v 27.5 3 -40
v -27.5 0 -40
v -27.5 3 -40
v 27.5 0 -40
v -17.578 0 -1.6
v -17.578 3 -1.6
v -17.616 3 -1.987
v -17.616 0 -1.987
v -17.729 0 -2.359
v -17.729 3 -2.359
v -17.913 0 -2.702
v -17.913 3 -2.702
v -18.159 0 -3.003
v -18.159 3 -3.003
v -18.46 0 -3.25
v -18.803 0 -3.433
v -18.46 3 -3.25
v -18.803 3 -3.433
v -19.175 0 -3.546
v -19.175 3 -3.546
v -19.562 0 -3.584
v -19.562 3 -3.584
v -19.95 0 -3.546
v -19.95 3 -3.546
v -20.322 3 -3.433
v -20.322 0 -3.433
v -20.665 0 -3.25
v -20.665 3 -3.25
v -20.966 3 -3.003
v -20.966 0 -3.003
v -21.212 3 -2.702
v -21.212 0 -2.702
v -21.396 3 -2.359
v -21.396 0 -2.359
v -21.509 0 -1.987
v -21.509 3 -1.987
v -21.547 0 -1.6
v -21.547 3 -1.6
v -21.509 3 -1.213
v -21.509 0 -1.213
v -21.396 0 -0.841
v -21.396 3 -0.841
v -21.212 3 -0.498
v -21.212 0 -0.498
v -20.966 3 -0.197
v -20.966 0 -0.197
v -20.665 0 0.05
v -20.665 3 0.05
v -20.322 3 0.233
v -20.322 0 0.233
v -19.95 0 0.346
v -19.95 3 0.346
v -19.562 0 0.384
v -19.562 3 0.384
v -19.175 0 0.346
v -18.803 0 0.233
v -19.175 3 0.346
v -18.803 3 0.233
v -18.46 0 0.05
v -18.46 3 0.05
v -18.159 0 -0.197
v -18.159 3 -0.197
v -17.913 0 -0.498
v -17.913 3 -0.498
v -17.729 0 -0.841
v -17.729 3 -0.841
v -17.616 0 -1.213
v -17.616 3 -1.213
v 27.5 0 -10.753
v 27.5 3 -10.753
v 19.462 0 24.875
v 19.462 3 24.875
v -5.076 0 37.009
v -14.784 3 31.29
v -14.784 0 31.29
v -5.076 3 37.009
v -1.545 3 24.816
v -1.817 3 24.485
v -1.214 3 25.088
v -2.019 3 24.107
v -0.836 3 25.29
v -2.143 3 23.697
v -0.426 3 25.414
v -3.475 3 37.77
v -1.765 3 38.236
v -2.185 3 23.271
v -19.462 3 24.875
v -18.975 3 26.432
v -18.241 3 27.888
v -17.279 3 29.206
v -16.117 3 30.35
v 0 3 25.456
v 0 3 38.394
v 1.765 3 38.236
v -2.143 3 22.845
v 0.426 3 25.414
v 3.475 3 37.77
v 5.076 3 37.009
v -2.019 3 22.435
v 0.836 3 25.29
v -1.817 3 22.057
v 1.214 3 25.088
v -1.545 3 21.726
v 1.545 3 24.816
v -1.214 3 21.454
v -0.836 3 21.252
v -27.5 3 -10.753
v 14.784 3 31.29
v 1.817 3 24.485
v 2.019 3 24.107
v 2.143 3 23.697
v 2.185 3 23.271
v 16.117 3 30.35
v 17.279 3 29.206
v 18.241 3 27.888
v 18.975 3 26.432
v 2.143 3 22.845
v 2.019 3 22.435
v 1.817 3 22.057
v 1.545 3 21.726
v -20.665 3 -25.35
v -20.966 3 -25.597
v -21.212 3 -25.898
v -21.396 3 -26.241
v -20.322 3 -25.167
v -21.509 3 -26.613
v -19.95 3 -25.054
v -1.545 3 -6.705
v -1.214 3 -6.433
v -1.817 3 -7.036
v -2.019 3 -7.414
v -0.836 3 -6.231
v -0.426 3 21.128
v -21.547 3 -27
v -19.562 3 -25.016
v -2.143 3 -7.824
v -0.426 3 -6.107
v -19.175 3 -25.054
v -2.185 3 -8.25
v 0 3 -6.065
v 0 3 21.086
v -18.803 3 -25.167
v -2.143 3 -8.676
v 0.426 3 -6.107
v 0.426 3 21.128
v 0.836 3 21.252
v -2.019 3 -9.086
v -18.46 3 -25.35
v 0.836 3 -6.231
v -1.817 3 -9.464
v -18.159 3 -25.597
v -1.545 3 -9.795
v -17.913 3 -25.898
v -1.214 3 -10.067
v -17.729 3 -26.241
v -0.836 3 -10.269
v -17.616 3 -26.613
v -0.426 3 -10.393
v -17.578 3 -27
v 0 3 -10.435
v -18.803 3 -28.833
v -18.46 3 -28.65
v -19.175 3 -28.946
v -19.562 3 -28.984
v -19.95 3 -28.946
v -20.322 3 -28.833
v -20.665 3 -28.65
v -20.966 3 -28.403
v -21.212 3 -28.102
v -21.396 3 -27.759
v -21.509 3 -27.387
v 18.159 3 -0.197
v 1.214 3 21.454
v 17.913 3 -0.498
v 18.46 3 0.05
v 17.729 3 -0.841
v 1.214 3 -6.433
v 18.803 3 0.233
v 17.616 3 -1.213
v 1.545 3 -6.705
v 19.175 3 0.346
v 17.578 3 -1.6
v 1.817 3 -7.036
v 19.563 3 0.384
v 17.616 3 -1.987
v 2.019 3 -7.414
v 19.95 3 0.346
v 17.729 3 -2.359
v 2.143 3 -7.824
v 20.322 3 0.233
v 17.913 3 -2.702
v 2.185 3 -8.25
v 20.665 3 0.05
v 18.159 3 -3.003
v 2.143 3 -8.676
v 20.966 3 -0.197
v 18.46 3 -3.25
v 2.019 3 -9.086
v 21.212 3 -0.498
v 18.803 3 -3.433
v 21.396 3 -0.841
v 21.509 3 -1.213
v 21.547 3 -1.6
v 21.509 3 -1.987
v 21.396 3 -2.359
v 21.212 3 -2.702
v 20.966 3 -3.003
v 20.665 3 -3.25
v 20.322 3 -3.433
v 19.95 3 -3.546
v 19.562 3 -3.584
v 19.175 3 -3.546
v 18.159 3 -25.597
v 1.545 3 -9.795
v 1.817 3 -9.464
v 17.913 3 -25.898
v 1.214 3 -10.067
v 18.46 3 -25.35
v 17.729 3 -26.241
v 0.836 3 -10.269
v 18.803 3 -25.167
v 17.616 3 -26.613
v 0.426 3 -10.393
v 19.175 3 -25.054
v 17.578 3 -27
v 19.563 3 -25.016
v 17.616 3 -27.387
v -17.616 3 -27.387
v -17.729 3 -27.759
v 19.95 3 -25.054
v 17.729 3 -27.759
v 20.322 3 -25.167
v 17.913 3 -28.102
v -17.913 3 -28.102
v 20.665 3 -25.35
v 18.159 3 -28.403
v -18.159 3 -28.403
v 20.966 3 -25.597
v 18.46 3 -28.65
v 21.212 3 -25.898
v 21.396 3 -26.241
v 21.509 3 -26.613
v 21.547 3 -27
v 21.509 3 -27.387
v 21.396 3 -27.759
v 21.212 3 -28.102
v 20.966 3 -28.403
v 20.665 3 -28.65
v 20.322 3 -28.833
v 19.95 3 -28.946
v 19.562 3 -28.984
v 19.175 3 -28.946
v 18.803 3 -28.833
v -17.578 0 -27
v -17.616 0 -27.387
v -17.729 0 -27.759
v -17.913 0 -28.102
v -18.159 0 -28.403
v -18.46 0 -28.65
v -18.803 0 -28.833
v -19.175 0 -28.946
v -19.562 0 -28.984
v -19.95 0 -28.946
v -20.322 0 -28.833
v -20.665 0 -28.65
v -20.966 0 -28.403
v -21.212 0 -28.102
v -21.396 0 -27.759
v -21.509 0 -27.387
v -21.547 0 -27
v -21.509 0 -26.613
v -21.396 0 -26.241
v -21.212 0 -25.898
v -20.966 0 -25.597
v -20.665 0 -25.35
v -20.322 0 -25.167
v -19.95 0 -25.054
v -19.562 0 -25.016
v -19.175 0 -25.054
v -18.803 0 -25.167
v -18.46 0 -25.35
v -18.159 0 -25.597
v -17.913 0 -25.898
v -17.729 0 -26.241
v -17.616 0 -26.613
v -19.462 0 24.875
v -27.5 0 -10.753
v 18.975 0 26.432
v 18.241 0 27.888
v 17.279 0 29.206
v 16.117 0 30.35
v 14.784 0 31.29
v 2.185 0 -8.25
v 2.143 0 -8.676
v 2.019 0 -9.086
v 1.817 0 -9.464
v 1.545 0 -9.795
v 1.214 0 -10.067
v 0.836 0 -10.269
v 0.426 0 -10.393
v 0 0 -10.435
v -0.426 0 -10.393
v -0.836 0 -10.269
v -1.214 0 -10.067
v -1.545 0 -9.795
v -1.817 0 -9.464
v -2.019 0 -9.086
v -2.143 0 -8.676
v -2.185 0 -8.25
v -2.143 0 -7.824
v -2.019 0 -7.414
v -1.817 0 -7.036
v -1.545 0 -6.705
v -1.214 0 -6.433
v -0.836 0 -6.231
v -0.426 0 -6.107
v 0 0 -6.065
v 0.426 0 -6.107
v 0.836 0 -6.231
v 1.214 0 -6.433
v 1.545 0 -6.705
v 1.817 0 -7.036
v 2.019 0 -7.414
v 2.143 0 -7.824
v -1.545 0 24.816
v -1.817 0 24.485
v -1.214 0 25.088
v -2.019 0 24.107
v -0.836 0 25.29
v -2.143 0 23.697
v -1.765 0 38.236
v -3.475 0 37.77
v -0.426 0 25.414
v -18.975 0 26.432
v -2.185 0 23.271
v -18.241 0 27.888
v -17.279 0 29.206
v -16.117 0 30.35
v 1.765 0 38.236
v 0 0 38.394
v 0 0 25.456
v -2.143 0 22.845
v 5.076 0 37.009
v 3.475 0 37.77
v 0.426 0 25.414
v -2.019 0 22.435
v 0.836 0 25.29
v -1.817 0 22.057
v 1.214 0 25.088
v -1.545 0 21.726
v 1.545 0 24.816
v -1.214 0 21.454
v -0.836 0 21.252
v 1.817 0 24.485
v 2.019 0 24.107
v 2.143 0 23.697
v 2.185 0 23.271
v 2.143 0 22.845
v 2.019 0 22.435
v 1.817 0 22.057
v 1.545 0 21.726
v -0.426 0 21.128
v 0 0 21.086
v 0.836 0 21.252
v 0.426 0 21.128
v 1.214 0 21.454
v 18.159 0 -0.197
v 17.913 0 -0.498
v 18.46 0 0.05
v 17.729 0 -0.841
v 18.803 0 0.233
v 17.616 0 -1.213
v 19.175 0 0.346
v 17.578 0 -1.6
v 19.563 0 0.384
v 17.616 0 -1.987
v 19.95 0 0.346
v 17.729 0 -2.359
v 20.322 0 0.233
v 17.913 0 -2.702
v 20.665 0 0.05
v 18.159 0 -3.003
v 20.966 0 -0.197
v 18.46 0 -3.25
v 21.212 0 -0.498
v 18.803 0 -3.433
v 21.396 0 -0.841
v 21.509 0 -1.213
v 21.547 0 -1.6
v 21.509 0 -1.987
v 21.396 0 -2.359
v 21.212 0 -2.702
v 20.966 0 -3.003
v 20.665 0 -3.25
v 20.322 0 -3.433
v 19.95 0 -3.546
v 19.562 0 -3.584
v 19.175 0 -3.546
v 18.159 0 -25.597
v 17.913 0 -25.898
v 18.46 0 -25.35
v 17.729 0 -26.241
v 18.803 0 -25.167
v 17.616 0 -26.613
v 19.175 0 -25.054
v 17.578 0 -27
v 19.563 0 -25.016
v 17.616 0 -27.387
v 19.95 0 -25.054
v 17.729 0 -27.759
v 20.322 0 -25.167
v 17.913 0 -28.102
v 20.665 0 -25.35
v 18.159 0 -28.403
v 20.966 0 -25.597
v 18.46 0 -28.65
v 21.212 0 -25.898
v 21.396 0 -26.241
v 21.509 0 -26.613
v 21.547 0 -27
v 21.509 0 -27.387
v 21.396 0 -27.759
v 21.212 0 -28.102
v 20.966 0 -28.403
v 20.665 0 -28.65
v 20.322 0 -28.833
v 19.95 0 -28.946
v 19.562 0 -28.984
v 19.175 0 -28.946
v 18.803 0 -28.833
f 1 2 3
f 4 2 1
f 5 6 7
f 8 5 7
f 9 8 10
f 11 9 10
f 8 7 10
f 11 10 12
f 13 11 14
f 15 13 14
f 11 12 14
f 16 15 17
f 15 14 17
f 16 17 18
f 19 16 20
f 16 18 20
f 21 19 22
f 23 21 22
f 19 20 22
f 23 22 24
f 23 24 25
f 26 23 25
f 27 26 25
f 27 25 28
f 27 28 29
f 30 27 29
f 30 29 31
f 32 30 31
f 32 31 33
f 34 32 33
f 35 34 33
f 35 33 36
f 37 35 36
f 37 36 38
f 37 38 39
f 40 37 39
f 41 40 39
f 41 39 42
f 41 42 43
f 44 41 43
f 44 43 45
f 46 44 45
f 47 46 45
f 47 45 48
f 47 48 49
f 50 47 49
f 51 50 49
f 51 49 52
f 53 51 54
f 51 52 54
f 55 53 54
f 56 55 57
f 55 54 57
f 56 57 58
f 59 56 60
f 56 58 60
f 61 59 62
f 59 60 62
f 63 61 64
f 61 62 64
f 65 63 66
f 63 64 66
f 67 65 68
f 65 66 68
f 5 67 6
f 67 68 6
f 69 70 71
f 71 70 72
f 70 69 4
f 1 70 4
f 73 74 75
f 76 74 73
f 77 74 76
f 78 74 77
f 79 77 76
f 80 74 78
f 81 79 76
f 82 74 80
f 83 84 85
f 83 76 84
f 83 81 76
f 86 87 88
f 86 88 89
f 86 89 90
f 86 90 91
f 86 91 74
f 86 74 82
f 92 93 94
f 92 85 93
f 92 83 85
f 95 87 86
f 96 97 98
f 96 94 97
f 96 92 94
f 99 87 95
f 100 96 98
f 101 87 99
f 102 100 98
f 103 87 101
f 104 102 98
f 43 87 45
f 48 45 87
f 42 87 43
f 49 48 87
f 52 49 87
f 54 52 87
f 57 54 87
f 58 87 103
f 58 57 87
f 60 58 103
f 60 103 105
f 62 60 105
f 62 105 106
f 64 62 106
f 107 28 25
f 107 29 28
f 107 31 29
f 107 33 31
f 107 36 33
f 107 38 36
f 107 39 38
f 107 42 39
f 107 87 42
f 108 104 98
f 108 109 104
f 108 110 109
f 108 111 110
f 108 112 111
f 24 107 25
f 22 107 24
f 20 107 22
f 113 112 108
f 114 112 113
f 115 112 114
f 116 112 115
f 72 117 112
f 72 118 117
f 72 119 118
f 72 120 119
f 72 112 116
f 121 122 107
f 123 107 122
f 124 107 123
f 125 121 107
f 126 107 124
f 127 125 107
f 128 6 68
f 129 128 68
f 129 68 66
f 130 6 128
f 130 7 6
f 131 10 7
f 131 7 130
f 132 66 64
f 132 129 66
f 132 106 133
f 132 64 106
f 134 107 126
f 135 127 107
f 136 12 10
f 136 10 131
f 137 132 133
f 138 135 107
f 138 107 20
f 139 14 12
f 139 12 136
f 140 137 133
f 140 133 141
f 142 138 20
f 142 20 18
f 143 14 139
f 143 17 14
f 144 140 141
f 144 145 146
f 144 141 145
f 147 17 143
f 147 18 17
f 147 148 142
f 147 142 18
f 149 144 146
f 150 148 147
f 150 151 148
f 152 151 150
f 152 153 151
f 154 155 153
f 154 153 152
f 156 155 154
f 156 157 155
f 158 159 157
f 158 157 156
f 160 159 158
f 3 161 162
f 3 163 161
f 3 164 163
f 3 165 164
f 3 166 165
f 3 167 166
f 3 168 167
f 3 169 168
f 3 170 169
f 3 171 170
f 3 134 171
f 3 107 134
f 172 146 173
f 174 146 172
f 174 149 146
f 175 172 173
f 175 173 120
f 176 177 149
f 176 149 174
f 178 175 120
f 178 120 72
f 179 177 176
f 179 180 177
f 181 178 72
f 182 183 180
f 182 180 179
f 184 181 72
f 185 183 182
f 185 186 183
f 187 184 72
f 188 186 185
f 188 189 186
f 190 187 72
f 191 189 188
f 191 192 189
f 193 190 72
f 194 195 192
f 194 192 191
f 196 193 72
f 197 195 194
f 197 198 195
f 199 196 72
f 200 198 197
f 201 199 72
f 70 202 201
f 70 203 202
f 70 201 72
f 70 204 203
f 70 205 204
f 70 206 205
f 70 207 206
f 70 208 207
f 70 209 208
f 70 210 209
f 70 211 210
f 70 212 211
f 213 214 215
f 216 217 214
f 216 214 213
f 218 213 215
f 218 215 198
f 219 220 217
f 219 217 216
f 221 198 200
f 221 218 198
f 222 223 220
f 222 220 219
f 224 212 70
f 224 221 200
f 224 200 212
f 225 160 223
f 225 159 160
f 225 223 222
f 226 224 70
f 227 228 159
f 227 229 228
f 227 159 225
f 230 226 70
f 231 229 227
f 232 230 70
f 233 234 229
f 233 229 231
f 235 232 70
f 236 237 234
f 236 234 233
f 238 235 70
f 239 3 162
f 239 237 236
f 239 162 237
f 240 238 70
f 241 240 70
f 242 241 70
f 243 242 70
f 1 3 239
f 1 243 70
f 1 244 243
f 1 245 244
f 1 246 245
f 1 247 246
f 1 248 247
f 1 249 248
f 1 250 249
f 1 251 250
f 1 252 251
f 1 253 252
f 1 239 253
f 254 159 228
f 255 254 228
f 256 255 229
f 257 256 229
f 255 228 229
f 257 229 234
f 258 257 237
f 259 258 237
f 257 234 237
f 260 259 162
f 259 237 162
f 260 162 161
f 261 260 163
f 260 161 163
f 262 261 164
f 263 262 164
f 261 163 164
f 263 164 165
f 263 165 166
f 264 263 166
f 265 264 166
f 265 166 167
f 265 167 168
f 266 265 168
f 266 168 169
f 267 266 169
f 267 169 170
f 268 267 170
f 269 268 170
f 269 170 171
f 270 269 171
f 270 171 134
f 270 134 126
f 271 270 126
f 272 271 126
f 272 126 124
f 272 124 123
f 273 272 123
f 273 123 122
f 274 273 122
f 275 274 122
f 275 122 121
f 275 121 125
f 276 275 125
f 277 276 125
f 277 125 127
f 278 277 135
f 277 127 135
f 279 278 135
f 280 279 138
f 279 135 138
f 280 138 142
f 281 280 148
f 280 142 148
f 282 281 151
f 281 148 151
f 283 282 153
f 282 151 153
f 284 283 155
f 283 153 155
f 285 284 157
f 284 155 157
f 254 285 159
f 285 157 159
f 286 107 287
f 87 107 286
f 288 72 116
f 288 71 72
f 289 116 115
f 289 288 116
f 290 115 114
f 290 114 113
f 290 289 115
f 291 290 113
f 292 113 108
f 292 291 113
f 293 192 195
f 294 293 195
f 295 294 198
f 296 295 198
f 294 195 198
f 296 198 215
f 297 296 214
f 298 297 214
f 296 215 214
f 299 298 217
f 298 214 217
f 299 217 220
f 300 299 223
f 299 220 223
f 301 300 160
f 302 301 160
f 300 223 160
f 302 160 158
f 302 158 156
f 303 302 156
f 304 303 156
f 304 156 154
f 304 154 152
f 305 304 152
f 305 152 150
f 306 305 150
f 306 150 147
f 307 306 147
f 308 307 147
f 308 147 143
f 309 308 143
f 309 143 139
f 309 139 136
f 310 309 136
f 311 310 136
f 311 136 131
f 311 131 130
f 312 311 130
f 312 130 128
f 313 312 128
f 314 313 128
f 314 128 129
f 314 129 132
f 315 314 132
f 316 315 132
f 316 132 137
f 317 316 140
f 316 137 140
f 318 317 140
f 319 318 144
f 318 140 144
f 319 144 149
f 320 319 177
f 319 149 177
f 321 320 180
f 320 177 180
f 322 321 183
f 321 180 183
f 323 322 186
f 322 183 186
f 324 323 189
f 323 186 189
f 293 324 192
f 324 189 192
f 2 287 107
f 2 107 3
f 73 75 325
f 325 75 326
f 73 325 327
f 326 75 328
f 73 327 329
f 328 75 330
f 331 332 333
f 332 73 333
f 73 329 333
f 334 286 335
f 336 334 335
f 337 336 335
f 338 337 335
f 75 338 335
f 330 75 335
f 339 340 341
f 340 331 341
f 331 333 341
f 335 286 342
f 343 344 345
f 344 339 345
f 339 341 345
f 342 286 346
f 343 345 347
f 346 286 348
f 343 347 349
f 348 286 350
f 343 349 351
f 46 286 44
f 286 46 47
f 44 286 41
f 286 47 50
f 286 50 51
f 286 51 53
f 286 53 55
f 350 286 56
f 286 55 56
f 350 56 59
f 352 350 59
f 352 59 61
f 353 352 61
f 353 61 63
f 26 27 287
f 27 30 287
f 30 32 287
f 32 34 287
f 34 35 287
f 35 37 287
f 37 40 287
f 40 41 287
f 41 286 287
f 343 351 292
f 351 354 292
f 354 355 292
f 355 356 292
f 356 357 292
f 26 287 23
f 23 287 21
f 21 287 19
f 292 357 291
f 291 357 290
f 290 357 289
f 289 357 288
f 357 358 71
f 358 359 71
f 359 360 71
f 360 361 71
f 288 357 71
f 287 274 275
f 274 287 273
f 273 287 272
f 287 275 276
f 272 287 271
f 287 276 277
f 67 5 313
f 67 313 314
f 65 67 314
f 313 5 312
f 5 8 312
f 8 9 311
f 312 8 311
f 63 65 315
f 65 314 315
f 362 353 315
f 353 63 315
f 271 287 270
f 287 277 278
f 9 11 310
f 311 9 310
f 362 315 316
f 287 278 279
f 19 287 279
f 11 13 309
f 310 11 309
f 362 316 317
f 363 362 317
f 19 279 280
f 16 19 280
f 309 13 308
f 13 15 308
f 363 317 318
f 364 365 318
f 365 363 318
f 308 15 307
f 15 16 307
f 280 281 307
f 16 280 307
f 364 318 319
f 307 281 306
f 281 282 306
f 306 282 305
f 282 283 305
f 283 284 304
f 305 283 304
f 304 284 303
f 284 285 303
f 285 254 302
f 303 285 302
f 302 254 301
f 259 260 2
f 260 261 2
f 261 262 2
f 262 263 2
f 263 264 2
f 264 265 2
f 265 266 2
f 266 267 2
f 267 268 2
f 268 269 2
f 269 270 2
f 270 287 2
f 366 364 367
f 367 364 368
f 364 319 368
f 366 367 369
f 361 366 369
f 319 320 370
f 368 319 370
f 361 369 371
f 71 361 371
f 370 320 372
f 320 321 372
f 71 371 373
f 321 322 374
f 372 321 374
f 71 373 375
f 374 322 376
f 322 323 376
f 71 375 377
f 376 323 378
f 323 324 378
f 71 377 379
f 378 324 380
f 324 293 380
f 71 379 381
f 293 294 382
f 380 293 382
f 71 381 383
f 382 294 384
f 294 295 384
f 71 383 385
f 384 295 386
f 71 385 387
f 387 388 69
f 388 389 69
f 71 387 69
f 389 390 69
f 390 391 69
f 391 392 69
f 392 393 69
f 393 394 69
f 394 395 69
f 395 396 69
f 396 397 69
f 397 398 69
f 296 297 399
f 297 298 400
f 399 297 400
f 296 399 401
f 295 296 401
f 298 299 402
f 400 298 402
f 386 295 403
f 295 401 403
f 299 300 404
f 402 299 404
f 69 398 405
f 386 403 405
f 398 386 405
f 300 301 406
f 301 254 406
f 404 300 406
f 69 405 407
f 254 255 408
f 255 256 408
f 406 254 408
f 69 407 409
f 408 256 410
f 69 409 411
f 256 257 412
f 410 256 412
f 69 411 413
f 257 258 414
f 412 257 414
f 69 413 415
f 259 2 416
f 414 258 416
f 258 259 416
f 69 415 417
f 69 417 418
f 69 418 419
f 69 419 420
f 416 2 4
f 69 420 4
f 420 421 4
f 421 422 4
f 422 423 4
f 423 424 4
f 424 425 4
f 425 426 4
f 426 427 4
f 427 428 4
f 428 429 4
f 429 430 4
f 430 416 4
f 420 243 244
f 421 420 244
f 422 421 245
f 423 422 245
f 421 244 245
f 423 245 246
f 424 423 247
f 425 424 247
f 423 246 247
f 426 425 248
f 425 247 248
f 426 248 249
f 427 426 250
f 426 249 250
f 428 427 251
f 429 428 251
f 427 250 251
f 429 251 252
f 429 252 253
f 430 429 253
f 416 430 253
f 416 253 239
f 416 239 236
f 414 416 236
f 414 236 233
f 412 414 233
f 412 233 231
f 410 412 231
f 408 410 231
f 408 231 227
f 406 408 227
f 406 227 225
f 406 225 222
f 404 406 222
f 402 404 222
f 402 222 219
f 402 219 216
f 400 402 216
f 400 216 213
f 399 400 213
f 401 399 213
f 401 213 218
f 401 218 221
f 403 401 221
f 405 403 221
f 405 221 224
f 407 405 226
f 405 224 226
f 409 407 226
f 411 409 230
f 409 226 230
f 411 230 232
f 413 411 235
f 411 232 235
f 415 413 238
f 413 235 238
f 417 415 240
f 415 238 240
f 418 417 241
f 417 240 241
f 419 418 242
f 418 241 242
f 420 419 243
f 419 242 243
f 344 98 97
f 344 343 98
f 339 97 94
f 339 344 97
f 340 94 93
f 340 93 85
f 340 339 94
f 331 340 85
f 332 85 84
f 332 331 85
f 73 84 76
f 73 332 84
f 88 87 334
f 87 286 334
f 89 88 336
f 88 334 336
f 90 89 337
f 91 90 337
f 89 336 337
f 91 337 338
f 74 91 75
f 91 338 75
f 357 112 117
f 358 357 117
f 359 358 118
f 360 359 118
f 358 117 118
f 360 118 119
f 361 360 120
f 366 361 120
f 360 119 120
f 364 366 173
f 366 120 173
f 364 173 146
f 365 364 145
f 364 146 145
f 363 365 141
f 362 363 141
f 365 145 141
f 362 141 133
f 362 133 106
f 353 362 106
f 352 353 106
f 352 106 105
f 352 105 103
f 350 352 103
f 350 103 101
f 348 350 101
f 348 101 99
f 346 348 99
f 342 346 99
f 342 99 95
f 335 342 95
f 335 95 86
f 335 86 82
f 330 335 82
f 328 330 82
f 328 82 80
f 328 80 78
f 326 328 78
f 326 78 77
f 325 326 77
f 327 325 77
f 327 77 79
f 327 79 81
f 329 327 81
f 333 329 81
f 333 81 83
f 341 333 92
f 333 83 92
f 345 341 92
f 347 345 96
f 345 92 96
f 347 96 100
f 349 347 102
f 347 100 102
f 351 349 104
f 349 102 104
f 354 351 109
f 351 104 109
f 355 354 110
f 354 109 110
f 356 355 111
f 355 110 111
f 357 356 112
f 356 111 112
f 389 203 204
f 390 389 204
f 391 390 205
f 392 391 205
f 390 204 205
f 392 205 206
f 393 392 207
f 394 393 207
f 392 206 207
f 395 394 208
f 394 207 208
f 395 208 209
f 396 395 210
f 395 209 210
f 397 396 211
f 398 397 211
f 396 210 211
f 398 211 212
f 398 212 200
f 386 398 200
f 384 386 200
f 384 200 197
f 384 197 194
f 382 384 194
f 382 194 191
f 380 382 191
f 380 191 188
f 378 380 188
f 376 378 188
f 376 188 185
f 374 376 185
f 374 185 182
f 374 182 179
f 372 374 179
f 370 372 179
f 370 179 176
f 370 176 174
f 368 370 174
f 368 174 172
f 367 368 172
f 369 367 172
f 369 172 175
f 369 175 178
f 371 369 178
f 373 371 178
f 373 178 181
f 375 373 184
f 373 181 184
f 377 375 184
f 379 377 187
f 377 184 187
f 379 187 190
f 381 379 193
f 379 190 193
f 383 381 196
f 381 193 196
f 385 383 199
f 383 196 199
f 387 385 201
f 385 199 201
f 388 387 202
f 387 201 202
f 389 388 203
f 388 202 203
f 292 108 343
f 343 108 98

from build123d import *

# Parameters (mm, degrees)
SKETCH1_W           = 55
SKETCH1_H           = 80
BOSS_EXTRUDE1_DEPTH = 3
SKETCH2_R           = 2.185
SKETCH2_R_2         = 1.984375
CUT_EXTRUDE1_DEPTH  = 4
CUT_EXTRUDE2_DEPTH  = 4
FILLET1_R           = 10


with BuildPart() as part:
    # Sketch1 → Boss-Extrude1 (new body)
    with BuildSketch(Plane(origin=(0, 0, 0), x_dir=(1, 0, 0), z_dir=(0, 1, 0))):
        Rectangle(SKETCH1_W, SKETCH1_H)
    extrude(amount=BOSS_EXTRUDE1_DEPTH)

    # Sketch2 → Cut-Extrude1 (cut, through all)
    with BuildSketch(Plane(origin=(0, 3, 0), x_dir=(1, 0, 0), z_dir=(0, 1, 0))):
        with Locations((0, 8.25)):
            Circle(SKETCH2_R)
        with Locations((0, -23.271)):
            Circle(SKETCH2_R)
        with Locations((-19.5625, 27)):
            Circle(SKETCH2_R_2)
        with Locations((-19.5625, 1.6)):
            Circle(SKETCH2_R_2)
        with Locations((19.5625, 27)):
            Circle(SKETCH2_R_2)
        with Locations((19.5625, 1.6)):
            Circle(SKETCH2_R_2)
    extrude(amount=-CUT_EXTRUDE1_DEPTH, mode=Mode.SUBTRACT)

    # Sketch3 → Cut-Extrude2 (cut, through all)
    with BuildSketch(Plane(origin=(0, 3, 0), x_dir=(1, 0, 0), z_dir=(0, 1, 0))):
        Polygon((18.510308796, -29.09449619), (0, -40), (27.5, -40), (27.5, 10.752872816), align=None)
    cut_extrude2 = extrude(amount=-CUT_EXTRUDE2_DEPTH, mode=Mode.SUBTRACT)

    # Mirror1: Cut-Extrude2 across plane
    add(cut_extrude2.mirror(Plane(origin=(0, 0, 0), x_dir=(0, 0, 1), z_dir=(1, 0, 0))), mode=Mode.SUBTRACT)

    # Fillet1
    fillet1_edges = [part.edges().sort_by_distance(p)[0] for p in [
        (18.510308796, 1.5, 29.09449619),
        (0, 1.5, 40),
        (-18.510308796, 1.5, 29.09449619),
    ]]
    fillet(fillet1_edges, radius=FILLET1_R)


solid = part.part
